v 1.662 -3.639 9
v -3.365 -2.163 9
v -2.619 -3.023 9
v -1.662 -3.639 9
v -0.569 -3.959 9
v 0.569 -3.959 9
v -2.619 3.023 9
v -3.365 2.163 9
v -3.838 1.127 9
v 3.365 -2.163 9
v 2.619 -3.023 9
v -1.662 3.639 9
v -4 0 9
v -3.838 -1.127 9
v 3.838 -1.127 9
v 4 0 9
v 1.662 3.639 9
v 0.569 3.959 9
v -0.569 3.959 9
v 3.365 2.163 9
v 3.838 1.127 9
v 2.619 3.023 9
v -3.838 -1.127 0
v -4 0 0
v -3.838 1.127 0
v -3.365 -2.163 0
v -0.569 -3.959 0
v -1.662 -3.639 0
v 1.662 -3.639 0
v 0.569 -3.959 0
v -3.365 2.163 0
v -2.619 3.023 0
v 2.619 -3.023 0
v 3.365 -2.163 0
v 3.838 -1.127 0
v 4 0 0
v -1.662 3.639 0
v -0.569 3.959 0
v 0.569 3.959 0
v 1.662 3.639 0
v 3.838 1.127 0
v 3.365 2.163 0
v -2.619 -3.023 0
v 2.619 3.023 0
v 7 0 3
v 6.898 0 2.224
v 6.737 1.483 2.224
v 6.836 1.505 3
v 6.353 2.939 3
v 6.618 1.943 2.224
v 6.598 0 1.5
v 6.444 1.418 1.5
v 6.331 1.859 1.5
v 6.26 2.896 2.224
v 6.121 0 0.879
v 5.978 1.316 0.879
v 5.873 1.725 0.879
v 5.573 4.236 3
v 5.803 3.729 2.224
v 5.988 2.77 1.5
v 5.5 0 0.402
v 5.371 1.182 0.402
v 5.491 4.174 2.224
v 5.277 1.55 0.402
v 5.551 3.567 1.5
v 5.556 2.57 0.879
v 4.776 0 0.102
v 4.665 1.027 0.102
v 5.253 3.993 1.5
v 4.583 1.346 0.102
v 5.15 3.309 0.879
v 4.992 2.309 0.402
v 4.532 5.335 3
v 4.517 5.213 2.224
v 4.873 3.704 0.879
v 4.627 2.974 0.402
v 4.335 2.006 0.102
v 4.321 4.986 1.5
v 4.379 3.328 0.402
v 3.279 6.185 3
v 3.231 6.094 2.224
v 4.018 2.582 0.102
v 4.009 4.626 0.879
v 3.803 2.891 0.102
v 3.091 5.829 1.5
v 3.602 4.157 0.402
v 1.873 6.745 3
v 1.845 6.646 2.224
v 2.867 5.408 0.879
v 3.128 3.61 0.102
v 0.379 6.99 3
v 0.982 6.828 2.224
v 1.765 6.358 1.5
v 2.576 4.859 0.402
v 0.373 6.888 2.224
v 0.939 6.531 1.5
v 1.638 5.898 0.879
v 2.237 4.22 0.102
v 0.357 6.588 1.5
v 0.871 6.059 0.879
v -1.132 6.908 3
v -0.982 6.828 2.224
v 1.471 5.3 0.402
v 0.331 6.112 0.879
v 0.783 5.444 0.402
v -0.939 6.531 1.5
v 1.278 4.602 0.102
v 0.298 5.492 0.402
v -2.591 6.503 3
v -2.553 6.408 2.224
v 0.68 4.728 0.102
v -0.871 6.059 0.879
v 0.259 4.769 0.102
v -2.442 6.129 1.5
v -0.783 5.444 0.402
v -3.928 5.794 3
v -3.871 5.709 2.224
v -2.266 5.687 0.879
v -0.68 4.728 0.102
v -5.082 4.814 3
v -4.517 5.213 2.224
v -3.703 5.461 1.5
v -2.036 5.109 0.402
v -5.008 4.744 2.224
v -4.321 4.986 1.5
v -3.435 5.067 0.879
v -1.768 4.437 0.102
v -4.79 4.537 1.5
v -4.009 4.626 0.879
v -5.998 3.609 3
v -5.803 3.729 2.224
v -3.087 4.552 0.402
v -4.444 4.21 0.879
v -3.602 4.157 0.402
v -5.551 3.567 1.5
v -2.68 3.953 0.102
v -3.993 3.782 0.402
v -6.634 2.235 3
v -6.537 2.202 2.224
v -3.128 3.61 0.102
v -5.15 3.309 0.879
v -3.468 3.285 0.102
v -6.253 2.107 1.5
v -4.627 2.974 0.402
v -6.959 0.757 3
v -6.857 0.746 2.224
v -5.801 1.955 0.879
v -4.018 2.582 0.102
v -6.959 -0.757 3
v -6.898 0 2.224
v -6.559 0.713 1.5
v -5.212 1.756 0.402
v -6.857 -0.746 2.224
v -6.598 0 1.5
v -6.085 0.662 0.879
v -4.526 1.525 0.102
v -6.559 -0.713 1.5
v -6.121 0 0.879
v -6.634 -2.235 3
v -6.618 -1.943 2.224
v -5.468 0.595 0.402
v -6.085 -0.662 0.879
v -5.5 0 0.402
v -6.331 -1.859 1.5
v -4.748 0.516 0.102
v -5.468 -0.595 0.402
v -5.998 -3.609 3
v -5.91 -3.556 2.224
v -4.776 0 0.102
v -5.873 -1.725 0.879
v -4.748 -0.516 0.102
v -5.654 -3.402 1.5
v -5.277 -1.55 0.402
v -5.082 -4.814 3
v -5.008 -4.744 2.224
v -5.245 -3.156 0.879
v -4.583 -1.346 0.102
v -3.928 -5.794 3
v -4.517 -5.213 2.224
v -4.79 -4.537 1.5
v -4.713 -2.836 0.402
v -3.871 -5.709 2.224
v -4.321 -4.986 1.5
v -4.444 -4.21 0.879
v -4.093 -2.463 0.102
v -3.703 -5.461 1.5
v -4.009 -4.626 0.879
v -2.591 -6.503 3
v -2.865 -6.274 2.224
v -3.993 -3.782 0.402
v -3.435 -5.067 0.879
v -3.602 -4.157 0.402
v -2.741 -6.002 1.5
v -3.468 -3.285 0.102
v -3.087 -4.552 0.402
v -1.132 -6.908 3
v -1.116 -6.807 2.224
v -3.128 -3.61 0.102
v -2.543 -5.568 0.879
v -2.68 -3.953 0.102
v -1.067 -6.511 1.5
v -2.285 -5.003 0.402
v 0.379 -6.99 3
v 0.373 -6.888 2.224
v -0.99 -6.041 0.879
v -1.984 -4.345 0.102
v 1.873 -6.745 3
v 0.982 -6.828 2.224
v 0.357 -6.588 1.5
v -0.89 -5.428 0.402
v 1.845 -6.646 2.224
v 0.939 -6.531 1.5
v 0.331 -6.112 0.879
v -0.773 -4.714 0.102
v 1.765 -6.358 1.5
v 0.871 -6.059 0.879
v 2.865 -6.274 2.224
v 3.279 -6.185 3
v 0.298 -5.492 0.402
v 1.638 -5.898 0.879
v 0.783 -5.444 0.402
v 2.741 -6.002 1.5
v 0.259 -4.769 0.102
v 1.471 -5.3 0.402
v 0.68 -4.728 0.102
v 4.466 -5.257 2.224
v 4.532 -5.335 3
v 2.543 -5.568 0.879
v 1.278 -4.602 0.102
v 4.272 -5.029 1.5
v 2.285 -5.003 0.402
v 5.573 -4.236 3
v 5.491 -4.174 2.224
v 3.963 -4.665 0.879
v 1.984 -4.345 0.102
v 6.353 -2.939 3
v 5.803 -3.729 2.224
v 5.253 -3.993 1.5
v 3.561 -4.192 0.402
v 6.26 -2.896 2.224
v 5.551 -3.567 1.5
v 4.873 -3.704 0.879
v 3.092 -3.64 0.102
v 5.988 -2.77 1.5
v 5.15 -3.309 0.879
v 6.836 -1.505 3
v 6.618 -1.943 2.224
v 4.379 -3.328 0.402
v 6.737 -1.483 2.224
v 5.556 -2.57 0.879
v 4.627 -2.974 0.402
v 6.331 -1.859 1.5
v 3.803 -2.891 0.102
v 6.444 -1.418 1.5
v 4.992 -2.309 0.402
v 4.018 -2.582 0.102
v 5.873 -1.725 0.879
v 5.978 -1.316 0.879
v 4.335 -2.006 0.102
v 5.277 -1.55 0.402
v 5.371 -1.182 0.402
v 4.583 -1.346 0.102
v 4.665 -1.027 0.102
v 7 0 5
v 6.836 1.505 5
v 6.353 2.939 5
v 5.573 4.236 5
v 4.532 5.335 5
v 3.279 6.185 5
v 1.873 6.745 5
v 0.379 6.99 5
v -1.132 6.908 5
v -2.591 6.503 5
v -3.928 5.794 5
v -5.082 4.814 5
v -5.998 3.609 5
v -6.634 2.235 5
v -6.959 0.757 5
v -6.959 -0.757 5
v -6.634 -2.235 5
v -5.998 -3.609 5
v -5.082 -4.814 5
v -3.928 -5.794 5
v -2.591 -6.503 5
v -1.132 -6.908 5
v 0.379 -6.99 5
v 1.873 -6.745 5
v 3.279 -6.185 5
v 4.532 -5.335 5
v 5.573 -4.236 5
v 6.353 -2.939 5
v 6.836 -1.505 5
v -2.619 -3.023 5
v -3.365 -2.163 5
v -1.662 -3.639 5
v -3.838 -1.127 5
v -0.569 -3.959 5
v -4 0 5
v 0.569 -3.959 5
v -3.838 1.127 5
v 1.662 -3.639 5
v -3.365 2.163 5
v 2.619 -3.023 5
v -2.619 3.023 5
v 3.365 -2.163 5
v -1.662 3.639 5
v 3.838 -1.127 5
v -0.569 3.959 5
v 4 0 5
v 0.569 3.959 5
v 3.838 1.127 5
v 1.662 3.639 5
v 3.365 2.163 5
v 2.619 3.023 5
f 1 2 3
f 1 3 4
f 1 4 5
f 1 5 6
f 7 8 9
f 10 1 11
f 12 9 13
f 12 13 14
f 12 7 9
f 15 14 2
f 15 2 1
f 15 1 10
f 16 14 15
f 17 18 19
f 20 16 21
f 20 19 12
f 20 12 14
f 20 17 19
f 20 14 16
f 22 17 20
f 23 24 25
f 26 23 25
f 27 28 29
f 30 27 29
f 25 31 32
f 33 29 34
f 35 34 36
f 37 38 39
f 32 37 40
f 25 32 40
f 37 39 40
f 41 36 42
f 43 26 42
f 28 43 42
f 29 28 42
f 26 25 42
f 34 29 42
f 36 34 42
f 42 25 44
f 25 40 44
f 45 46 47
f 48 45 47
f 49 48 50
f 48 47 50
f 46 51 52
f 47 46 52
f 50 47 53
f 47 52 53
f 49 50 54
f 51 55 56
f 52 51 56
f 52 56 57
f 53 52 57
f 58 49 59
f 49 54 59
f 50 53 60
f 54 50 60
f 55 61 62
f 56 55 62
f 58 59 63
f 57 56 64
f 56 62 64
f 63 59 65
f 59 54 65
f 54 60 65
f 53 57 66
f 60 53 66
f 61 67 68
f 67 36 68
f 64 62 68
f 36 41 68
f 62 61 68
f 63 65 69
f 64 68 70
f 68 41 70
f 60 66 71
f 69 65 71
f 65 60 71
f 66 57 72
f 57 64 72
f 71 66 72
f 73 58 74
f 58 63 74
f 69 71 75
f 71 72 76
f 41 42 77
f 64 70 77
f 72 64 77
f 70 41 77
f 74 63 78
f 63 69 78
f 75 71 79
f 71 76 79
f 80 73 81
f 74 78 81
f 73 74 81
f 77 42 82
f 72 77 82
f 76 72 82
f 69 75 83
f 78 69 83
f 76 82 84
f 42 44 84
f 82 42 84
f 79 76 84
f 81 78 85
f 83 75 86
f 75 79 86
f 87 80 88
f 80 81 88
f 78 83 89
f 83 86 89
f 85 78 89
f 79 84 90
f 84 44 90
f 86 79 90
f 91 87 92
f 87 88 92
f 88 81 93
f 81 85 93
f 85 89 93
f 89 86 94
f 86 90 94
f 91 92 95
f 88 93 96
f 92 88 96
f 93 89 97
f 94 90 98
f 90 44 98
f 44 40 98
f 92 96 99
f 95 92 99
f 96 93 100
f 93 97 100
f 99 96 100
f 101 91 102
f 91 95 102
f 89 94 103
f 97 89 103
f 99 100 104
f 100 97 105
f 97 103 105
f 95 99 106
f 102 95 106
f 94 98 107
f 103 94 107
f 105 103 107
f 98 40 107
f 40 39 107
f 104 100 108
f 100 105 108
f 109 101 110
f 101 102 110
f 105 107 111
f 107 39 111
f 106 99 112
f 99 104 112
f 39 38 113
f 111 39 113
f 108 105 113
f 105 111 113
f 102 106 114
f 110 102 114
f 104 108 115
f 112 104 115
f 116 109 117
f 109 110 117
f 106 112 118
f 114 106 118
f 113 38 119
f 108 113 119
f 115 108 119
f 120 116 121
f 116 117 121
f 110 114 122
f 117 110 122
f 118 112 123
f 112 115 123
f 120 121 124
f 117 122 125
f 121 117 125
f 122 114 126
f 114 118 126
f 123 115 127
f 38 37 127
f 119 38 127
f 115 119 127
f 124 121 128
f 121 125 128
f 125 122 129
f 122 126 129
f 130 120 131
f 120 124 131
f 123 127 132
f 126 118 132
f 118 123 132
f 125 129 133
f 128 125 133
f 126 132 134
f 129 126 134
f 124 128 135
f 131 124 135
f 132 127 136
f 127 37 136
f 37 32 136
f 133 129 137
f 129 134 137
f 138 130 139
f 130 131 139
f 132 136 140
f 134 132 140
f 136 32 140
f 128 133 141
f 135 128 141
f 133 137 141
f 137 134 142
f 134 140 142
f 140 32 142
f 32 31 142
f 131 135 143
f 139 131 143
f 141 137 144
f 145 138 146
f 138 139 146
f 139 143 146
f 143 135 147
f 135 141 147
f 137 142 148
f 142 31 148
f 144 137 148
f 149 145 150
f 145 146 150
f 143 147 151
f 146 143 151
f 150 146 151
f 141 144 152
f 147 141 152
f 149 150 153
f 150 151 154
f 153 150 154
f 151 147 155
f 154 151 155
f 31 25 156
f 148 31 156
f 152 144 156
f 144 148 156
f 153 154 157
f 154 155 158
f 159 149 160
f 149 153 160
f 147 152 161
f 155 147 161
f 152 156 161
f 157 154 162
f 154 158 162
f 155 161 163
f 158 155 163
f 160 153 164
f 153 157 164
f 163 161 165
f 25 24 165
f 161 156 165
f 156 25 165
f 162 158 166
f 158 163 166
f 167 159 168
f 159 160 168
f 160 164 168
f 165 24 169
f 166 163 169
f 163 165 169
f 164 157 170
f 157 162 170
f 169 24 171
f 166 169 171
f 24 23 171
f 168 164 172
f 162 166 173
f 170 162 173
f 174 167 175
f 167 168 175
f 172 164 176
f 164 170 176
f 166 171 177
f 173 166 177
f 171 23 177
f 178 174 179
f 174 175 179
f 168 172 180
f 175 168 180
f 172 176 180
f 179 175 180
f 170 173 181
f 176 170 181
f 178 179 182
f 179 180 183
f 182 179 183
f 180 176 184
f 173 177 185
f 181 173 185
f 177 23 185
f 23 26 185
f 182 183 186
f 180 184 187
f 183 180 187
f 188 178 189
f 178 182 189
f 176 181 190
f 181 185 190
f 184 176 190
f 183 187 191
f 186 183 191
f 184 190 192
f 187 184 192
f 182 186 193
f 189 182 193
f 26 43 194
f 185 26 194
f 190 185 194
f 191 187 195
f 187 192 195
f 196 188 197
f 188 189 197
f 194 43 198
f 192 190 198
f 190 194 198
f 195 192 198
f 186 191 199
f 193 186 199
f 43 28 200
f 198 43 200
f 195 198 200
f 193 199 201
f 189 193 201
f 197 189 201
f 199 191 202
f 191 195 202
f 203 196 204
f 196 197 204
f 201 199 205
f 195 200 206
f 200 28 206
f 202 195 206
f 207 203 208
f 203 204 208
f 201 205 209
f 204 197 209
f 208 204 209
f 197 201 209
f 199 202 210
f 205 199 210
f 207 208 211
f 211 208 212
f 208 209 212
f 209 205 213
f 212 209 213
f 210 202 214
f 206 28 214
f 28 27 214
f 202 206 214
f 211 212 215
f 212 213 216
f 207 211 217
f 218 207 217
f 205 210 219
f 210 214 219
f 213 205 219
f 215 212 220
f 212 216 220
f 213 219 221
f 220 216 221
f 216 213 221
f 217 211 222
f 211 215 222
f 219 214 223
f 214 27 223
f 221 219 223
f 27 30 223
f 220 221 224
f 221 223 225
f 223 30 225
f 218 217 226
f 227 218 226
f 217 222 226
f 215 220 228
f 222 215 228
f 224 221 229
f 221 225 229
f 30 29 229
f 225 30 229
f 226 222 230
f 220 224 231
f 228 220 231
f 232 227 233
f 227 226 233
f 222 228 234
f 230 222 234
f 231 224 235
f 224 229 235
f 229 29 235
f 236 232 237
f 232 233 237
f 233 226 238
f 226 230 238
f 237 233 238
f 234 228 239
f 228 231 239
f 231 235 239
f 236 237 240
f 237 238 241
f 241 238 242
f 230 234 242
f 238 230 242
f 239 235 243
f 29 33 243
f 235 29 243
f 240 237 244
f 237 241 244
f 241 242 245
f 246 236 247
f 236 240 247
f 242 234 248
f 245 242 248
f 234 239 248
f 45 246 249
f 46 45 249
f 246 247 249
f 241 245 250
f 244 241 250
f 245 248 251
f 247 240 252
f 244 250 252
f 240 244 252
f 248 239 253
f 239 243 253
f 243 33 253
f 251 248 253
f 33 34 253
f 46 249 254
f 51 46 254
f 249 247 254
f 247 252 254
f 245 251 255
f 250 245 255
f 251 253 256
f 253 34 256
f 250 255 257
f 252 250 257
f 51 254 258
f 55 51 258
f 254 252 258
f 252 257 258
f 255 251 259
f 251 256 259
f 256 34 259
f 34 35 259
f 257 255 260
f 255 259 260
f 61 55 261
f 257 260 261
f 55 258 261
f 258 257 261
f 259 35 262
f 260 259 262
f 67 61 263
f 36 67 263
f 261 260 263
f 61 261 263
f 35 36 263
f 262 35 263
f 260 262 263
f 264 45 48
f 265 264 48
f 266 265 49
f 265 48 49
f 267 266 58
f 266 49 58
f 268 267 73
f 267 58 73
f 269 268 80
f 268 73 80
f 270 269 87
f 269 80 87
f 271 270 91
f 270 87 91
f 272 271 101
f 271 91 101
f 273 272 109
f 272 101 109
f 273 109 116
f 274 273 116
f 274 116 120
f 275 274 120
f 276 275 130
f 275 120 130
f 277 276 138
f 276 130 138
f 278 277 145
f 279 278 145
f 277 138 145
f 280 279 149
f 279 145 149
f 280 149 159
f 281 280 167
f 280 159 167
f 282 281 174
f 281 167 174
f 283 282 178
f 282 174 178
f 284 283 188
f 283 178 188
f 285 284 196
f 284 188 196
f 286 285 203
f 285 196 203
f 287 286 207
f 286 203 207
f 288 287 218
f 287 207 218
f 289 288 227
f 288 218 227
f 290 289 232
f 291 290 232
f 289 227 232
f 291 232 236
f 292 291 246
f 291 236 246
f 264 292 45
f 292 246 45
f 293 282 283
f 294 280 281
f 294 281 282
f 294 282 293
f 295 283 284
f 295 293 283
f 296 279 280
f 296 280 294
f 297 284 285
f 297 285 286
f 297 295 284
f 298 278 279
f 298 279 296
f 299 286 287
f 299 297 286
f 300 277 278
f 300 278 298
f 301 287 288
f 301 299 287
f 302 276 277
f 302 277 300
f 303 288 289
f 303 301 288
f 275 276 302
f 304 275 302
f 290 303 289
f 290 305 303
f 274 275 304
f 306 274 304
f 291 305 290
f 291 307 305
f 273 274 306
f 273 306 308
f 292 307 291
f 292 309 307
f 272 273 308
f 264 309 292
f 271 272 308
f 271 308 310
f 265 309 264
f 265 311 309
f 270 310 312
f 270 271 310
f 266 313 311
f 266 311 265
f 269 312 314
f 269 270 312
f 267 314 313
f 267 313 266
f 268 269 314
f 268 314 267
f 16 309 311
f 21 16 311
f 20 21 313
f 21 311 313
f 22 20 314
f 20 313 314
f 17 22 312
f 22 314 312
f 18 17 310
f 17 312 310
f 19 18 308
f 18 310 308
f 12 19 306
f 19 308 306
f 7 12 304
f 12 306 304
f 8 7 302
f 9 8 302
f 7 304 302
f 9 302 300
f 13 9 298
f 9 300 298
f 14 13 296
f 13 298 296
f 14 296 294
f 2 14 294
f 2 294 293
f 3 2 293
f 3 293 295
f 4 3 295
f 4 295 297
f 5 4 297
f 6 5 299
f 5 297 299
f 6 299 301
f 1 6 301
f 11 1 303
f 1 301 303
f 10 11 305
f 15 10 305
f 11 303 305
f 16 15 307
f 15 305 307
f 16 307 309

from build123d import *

# Parameters (mm, degrees)
ESQUISSE1_R          = 7
BASE_EXTRUSION_DEPTH = 5
CONG_1_R             = 3
ESQUISSE2_R          = 4
BOSS_EXTRU_2_DEPTH   = 4


with BuildPart() as part:
    # Esquisse1 → Base-Extrusion (new body)
    with BuildSketch(Plane.XY):
        Circle(ESQUISSE1_R)
    extrude(amount=BASE_EXTRUSION_DEPTH)

    # Congé1
    cong_1_edges = [part.edges().sort_by_distance(p)[0] for p in [
        (-7, 0, 0),
    ]]
    fillet(cong_1_edges, radius=CONG_1_R)

    # Esquisse2 → Boss.-Extru.2 (add)
    with BuildSketch(Plane.XY.offset(5)):
        Circle(ESQUISSE2_R)
    extrude(amount=BOSS_EXTRU_2_DEPTH)


solid = part.part
